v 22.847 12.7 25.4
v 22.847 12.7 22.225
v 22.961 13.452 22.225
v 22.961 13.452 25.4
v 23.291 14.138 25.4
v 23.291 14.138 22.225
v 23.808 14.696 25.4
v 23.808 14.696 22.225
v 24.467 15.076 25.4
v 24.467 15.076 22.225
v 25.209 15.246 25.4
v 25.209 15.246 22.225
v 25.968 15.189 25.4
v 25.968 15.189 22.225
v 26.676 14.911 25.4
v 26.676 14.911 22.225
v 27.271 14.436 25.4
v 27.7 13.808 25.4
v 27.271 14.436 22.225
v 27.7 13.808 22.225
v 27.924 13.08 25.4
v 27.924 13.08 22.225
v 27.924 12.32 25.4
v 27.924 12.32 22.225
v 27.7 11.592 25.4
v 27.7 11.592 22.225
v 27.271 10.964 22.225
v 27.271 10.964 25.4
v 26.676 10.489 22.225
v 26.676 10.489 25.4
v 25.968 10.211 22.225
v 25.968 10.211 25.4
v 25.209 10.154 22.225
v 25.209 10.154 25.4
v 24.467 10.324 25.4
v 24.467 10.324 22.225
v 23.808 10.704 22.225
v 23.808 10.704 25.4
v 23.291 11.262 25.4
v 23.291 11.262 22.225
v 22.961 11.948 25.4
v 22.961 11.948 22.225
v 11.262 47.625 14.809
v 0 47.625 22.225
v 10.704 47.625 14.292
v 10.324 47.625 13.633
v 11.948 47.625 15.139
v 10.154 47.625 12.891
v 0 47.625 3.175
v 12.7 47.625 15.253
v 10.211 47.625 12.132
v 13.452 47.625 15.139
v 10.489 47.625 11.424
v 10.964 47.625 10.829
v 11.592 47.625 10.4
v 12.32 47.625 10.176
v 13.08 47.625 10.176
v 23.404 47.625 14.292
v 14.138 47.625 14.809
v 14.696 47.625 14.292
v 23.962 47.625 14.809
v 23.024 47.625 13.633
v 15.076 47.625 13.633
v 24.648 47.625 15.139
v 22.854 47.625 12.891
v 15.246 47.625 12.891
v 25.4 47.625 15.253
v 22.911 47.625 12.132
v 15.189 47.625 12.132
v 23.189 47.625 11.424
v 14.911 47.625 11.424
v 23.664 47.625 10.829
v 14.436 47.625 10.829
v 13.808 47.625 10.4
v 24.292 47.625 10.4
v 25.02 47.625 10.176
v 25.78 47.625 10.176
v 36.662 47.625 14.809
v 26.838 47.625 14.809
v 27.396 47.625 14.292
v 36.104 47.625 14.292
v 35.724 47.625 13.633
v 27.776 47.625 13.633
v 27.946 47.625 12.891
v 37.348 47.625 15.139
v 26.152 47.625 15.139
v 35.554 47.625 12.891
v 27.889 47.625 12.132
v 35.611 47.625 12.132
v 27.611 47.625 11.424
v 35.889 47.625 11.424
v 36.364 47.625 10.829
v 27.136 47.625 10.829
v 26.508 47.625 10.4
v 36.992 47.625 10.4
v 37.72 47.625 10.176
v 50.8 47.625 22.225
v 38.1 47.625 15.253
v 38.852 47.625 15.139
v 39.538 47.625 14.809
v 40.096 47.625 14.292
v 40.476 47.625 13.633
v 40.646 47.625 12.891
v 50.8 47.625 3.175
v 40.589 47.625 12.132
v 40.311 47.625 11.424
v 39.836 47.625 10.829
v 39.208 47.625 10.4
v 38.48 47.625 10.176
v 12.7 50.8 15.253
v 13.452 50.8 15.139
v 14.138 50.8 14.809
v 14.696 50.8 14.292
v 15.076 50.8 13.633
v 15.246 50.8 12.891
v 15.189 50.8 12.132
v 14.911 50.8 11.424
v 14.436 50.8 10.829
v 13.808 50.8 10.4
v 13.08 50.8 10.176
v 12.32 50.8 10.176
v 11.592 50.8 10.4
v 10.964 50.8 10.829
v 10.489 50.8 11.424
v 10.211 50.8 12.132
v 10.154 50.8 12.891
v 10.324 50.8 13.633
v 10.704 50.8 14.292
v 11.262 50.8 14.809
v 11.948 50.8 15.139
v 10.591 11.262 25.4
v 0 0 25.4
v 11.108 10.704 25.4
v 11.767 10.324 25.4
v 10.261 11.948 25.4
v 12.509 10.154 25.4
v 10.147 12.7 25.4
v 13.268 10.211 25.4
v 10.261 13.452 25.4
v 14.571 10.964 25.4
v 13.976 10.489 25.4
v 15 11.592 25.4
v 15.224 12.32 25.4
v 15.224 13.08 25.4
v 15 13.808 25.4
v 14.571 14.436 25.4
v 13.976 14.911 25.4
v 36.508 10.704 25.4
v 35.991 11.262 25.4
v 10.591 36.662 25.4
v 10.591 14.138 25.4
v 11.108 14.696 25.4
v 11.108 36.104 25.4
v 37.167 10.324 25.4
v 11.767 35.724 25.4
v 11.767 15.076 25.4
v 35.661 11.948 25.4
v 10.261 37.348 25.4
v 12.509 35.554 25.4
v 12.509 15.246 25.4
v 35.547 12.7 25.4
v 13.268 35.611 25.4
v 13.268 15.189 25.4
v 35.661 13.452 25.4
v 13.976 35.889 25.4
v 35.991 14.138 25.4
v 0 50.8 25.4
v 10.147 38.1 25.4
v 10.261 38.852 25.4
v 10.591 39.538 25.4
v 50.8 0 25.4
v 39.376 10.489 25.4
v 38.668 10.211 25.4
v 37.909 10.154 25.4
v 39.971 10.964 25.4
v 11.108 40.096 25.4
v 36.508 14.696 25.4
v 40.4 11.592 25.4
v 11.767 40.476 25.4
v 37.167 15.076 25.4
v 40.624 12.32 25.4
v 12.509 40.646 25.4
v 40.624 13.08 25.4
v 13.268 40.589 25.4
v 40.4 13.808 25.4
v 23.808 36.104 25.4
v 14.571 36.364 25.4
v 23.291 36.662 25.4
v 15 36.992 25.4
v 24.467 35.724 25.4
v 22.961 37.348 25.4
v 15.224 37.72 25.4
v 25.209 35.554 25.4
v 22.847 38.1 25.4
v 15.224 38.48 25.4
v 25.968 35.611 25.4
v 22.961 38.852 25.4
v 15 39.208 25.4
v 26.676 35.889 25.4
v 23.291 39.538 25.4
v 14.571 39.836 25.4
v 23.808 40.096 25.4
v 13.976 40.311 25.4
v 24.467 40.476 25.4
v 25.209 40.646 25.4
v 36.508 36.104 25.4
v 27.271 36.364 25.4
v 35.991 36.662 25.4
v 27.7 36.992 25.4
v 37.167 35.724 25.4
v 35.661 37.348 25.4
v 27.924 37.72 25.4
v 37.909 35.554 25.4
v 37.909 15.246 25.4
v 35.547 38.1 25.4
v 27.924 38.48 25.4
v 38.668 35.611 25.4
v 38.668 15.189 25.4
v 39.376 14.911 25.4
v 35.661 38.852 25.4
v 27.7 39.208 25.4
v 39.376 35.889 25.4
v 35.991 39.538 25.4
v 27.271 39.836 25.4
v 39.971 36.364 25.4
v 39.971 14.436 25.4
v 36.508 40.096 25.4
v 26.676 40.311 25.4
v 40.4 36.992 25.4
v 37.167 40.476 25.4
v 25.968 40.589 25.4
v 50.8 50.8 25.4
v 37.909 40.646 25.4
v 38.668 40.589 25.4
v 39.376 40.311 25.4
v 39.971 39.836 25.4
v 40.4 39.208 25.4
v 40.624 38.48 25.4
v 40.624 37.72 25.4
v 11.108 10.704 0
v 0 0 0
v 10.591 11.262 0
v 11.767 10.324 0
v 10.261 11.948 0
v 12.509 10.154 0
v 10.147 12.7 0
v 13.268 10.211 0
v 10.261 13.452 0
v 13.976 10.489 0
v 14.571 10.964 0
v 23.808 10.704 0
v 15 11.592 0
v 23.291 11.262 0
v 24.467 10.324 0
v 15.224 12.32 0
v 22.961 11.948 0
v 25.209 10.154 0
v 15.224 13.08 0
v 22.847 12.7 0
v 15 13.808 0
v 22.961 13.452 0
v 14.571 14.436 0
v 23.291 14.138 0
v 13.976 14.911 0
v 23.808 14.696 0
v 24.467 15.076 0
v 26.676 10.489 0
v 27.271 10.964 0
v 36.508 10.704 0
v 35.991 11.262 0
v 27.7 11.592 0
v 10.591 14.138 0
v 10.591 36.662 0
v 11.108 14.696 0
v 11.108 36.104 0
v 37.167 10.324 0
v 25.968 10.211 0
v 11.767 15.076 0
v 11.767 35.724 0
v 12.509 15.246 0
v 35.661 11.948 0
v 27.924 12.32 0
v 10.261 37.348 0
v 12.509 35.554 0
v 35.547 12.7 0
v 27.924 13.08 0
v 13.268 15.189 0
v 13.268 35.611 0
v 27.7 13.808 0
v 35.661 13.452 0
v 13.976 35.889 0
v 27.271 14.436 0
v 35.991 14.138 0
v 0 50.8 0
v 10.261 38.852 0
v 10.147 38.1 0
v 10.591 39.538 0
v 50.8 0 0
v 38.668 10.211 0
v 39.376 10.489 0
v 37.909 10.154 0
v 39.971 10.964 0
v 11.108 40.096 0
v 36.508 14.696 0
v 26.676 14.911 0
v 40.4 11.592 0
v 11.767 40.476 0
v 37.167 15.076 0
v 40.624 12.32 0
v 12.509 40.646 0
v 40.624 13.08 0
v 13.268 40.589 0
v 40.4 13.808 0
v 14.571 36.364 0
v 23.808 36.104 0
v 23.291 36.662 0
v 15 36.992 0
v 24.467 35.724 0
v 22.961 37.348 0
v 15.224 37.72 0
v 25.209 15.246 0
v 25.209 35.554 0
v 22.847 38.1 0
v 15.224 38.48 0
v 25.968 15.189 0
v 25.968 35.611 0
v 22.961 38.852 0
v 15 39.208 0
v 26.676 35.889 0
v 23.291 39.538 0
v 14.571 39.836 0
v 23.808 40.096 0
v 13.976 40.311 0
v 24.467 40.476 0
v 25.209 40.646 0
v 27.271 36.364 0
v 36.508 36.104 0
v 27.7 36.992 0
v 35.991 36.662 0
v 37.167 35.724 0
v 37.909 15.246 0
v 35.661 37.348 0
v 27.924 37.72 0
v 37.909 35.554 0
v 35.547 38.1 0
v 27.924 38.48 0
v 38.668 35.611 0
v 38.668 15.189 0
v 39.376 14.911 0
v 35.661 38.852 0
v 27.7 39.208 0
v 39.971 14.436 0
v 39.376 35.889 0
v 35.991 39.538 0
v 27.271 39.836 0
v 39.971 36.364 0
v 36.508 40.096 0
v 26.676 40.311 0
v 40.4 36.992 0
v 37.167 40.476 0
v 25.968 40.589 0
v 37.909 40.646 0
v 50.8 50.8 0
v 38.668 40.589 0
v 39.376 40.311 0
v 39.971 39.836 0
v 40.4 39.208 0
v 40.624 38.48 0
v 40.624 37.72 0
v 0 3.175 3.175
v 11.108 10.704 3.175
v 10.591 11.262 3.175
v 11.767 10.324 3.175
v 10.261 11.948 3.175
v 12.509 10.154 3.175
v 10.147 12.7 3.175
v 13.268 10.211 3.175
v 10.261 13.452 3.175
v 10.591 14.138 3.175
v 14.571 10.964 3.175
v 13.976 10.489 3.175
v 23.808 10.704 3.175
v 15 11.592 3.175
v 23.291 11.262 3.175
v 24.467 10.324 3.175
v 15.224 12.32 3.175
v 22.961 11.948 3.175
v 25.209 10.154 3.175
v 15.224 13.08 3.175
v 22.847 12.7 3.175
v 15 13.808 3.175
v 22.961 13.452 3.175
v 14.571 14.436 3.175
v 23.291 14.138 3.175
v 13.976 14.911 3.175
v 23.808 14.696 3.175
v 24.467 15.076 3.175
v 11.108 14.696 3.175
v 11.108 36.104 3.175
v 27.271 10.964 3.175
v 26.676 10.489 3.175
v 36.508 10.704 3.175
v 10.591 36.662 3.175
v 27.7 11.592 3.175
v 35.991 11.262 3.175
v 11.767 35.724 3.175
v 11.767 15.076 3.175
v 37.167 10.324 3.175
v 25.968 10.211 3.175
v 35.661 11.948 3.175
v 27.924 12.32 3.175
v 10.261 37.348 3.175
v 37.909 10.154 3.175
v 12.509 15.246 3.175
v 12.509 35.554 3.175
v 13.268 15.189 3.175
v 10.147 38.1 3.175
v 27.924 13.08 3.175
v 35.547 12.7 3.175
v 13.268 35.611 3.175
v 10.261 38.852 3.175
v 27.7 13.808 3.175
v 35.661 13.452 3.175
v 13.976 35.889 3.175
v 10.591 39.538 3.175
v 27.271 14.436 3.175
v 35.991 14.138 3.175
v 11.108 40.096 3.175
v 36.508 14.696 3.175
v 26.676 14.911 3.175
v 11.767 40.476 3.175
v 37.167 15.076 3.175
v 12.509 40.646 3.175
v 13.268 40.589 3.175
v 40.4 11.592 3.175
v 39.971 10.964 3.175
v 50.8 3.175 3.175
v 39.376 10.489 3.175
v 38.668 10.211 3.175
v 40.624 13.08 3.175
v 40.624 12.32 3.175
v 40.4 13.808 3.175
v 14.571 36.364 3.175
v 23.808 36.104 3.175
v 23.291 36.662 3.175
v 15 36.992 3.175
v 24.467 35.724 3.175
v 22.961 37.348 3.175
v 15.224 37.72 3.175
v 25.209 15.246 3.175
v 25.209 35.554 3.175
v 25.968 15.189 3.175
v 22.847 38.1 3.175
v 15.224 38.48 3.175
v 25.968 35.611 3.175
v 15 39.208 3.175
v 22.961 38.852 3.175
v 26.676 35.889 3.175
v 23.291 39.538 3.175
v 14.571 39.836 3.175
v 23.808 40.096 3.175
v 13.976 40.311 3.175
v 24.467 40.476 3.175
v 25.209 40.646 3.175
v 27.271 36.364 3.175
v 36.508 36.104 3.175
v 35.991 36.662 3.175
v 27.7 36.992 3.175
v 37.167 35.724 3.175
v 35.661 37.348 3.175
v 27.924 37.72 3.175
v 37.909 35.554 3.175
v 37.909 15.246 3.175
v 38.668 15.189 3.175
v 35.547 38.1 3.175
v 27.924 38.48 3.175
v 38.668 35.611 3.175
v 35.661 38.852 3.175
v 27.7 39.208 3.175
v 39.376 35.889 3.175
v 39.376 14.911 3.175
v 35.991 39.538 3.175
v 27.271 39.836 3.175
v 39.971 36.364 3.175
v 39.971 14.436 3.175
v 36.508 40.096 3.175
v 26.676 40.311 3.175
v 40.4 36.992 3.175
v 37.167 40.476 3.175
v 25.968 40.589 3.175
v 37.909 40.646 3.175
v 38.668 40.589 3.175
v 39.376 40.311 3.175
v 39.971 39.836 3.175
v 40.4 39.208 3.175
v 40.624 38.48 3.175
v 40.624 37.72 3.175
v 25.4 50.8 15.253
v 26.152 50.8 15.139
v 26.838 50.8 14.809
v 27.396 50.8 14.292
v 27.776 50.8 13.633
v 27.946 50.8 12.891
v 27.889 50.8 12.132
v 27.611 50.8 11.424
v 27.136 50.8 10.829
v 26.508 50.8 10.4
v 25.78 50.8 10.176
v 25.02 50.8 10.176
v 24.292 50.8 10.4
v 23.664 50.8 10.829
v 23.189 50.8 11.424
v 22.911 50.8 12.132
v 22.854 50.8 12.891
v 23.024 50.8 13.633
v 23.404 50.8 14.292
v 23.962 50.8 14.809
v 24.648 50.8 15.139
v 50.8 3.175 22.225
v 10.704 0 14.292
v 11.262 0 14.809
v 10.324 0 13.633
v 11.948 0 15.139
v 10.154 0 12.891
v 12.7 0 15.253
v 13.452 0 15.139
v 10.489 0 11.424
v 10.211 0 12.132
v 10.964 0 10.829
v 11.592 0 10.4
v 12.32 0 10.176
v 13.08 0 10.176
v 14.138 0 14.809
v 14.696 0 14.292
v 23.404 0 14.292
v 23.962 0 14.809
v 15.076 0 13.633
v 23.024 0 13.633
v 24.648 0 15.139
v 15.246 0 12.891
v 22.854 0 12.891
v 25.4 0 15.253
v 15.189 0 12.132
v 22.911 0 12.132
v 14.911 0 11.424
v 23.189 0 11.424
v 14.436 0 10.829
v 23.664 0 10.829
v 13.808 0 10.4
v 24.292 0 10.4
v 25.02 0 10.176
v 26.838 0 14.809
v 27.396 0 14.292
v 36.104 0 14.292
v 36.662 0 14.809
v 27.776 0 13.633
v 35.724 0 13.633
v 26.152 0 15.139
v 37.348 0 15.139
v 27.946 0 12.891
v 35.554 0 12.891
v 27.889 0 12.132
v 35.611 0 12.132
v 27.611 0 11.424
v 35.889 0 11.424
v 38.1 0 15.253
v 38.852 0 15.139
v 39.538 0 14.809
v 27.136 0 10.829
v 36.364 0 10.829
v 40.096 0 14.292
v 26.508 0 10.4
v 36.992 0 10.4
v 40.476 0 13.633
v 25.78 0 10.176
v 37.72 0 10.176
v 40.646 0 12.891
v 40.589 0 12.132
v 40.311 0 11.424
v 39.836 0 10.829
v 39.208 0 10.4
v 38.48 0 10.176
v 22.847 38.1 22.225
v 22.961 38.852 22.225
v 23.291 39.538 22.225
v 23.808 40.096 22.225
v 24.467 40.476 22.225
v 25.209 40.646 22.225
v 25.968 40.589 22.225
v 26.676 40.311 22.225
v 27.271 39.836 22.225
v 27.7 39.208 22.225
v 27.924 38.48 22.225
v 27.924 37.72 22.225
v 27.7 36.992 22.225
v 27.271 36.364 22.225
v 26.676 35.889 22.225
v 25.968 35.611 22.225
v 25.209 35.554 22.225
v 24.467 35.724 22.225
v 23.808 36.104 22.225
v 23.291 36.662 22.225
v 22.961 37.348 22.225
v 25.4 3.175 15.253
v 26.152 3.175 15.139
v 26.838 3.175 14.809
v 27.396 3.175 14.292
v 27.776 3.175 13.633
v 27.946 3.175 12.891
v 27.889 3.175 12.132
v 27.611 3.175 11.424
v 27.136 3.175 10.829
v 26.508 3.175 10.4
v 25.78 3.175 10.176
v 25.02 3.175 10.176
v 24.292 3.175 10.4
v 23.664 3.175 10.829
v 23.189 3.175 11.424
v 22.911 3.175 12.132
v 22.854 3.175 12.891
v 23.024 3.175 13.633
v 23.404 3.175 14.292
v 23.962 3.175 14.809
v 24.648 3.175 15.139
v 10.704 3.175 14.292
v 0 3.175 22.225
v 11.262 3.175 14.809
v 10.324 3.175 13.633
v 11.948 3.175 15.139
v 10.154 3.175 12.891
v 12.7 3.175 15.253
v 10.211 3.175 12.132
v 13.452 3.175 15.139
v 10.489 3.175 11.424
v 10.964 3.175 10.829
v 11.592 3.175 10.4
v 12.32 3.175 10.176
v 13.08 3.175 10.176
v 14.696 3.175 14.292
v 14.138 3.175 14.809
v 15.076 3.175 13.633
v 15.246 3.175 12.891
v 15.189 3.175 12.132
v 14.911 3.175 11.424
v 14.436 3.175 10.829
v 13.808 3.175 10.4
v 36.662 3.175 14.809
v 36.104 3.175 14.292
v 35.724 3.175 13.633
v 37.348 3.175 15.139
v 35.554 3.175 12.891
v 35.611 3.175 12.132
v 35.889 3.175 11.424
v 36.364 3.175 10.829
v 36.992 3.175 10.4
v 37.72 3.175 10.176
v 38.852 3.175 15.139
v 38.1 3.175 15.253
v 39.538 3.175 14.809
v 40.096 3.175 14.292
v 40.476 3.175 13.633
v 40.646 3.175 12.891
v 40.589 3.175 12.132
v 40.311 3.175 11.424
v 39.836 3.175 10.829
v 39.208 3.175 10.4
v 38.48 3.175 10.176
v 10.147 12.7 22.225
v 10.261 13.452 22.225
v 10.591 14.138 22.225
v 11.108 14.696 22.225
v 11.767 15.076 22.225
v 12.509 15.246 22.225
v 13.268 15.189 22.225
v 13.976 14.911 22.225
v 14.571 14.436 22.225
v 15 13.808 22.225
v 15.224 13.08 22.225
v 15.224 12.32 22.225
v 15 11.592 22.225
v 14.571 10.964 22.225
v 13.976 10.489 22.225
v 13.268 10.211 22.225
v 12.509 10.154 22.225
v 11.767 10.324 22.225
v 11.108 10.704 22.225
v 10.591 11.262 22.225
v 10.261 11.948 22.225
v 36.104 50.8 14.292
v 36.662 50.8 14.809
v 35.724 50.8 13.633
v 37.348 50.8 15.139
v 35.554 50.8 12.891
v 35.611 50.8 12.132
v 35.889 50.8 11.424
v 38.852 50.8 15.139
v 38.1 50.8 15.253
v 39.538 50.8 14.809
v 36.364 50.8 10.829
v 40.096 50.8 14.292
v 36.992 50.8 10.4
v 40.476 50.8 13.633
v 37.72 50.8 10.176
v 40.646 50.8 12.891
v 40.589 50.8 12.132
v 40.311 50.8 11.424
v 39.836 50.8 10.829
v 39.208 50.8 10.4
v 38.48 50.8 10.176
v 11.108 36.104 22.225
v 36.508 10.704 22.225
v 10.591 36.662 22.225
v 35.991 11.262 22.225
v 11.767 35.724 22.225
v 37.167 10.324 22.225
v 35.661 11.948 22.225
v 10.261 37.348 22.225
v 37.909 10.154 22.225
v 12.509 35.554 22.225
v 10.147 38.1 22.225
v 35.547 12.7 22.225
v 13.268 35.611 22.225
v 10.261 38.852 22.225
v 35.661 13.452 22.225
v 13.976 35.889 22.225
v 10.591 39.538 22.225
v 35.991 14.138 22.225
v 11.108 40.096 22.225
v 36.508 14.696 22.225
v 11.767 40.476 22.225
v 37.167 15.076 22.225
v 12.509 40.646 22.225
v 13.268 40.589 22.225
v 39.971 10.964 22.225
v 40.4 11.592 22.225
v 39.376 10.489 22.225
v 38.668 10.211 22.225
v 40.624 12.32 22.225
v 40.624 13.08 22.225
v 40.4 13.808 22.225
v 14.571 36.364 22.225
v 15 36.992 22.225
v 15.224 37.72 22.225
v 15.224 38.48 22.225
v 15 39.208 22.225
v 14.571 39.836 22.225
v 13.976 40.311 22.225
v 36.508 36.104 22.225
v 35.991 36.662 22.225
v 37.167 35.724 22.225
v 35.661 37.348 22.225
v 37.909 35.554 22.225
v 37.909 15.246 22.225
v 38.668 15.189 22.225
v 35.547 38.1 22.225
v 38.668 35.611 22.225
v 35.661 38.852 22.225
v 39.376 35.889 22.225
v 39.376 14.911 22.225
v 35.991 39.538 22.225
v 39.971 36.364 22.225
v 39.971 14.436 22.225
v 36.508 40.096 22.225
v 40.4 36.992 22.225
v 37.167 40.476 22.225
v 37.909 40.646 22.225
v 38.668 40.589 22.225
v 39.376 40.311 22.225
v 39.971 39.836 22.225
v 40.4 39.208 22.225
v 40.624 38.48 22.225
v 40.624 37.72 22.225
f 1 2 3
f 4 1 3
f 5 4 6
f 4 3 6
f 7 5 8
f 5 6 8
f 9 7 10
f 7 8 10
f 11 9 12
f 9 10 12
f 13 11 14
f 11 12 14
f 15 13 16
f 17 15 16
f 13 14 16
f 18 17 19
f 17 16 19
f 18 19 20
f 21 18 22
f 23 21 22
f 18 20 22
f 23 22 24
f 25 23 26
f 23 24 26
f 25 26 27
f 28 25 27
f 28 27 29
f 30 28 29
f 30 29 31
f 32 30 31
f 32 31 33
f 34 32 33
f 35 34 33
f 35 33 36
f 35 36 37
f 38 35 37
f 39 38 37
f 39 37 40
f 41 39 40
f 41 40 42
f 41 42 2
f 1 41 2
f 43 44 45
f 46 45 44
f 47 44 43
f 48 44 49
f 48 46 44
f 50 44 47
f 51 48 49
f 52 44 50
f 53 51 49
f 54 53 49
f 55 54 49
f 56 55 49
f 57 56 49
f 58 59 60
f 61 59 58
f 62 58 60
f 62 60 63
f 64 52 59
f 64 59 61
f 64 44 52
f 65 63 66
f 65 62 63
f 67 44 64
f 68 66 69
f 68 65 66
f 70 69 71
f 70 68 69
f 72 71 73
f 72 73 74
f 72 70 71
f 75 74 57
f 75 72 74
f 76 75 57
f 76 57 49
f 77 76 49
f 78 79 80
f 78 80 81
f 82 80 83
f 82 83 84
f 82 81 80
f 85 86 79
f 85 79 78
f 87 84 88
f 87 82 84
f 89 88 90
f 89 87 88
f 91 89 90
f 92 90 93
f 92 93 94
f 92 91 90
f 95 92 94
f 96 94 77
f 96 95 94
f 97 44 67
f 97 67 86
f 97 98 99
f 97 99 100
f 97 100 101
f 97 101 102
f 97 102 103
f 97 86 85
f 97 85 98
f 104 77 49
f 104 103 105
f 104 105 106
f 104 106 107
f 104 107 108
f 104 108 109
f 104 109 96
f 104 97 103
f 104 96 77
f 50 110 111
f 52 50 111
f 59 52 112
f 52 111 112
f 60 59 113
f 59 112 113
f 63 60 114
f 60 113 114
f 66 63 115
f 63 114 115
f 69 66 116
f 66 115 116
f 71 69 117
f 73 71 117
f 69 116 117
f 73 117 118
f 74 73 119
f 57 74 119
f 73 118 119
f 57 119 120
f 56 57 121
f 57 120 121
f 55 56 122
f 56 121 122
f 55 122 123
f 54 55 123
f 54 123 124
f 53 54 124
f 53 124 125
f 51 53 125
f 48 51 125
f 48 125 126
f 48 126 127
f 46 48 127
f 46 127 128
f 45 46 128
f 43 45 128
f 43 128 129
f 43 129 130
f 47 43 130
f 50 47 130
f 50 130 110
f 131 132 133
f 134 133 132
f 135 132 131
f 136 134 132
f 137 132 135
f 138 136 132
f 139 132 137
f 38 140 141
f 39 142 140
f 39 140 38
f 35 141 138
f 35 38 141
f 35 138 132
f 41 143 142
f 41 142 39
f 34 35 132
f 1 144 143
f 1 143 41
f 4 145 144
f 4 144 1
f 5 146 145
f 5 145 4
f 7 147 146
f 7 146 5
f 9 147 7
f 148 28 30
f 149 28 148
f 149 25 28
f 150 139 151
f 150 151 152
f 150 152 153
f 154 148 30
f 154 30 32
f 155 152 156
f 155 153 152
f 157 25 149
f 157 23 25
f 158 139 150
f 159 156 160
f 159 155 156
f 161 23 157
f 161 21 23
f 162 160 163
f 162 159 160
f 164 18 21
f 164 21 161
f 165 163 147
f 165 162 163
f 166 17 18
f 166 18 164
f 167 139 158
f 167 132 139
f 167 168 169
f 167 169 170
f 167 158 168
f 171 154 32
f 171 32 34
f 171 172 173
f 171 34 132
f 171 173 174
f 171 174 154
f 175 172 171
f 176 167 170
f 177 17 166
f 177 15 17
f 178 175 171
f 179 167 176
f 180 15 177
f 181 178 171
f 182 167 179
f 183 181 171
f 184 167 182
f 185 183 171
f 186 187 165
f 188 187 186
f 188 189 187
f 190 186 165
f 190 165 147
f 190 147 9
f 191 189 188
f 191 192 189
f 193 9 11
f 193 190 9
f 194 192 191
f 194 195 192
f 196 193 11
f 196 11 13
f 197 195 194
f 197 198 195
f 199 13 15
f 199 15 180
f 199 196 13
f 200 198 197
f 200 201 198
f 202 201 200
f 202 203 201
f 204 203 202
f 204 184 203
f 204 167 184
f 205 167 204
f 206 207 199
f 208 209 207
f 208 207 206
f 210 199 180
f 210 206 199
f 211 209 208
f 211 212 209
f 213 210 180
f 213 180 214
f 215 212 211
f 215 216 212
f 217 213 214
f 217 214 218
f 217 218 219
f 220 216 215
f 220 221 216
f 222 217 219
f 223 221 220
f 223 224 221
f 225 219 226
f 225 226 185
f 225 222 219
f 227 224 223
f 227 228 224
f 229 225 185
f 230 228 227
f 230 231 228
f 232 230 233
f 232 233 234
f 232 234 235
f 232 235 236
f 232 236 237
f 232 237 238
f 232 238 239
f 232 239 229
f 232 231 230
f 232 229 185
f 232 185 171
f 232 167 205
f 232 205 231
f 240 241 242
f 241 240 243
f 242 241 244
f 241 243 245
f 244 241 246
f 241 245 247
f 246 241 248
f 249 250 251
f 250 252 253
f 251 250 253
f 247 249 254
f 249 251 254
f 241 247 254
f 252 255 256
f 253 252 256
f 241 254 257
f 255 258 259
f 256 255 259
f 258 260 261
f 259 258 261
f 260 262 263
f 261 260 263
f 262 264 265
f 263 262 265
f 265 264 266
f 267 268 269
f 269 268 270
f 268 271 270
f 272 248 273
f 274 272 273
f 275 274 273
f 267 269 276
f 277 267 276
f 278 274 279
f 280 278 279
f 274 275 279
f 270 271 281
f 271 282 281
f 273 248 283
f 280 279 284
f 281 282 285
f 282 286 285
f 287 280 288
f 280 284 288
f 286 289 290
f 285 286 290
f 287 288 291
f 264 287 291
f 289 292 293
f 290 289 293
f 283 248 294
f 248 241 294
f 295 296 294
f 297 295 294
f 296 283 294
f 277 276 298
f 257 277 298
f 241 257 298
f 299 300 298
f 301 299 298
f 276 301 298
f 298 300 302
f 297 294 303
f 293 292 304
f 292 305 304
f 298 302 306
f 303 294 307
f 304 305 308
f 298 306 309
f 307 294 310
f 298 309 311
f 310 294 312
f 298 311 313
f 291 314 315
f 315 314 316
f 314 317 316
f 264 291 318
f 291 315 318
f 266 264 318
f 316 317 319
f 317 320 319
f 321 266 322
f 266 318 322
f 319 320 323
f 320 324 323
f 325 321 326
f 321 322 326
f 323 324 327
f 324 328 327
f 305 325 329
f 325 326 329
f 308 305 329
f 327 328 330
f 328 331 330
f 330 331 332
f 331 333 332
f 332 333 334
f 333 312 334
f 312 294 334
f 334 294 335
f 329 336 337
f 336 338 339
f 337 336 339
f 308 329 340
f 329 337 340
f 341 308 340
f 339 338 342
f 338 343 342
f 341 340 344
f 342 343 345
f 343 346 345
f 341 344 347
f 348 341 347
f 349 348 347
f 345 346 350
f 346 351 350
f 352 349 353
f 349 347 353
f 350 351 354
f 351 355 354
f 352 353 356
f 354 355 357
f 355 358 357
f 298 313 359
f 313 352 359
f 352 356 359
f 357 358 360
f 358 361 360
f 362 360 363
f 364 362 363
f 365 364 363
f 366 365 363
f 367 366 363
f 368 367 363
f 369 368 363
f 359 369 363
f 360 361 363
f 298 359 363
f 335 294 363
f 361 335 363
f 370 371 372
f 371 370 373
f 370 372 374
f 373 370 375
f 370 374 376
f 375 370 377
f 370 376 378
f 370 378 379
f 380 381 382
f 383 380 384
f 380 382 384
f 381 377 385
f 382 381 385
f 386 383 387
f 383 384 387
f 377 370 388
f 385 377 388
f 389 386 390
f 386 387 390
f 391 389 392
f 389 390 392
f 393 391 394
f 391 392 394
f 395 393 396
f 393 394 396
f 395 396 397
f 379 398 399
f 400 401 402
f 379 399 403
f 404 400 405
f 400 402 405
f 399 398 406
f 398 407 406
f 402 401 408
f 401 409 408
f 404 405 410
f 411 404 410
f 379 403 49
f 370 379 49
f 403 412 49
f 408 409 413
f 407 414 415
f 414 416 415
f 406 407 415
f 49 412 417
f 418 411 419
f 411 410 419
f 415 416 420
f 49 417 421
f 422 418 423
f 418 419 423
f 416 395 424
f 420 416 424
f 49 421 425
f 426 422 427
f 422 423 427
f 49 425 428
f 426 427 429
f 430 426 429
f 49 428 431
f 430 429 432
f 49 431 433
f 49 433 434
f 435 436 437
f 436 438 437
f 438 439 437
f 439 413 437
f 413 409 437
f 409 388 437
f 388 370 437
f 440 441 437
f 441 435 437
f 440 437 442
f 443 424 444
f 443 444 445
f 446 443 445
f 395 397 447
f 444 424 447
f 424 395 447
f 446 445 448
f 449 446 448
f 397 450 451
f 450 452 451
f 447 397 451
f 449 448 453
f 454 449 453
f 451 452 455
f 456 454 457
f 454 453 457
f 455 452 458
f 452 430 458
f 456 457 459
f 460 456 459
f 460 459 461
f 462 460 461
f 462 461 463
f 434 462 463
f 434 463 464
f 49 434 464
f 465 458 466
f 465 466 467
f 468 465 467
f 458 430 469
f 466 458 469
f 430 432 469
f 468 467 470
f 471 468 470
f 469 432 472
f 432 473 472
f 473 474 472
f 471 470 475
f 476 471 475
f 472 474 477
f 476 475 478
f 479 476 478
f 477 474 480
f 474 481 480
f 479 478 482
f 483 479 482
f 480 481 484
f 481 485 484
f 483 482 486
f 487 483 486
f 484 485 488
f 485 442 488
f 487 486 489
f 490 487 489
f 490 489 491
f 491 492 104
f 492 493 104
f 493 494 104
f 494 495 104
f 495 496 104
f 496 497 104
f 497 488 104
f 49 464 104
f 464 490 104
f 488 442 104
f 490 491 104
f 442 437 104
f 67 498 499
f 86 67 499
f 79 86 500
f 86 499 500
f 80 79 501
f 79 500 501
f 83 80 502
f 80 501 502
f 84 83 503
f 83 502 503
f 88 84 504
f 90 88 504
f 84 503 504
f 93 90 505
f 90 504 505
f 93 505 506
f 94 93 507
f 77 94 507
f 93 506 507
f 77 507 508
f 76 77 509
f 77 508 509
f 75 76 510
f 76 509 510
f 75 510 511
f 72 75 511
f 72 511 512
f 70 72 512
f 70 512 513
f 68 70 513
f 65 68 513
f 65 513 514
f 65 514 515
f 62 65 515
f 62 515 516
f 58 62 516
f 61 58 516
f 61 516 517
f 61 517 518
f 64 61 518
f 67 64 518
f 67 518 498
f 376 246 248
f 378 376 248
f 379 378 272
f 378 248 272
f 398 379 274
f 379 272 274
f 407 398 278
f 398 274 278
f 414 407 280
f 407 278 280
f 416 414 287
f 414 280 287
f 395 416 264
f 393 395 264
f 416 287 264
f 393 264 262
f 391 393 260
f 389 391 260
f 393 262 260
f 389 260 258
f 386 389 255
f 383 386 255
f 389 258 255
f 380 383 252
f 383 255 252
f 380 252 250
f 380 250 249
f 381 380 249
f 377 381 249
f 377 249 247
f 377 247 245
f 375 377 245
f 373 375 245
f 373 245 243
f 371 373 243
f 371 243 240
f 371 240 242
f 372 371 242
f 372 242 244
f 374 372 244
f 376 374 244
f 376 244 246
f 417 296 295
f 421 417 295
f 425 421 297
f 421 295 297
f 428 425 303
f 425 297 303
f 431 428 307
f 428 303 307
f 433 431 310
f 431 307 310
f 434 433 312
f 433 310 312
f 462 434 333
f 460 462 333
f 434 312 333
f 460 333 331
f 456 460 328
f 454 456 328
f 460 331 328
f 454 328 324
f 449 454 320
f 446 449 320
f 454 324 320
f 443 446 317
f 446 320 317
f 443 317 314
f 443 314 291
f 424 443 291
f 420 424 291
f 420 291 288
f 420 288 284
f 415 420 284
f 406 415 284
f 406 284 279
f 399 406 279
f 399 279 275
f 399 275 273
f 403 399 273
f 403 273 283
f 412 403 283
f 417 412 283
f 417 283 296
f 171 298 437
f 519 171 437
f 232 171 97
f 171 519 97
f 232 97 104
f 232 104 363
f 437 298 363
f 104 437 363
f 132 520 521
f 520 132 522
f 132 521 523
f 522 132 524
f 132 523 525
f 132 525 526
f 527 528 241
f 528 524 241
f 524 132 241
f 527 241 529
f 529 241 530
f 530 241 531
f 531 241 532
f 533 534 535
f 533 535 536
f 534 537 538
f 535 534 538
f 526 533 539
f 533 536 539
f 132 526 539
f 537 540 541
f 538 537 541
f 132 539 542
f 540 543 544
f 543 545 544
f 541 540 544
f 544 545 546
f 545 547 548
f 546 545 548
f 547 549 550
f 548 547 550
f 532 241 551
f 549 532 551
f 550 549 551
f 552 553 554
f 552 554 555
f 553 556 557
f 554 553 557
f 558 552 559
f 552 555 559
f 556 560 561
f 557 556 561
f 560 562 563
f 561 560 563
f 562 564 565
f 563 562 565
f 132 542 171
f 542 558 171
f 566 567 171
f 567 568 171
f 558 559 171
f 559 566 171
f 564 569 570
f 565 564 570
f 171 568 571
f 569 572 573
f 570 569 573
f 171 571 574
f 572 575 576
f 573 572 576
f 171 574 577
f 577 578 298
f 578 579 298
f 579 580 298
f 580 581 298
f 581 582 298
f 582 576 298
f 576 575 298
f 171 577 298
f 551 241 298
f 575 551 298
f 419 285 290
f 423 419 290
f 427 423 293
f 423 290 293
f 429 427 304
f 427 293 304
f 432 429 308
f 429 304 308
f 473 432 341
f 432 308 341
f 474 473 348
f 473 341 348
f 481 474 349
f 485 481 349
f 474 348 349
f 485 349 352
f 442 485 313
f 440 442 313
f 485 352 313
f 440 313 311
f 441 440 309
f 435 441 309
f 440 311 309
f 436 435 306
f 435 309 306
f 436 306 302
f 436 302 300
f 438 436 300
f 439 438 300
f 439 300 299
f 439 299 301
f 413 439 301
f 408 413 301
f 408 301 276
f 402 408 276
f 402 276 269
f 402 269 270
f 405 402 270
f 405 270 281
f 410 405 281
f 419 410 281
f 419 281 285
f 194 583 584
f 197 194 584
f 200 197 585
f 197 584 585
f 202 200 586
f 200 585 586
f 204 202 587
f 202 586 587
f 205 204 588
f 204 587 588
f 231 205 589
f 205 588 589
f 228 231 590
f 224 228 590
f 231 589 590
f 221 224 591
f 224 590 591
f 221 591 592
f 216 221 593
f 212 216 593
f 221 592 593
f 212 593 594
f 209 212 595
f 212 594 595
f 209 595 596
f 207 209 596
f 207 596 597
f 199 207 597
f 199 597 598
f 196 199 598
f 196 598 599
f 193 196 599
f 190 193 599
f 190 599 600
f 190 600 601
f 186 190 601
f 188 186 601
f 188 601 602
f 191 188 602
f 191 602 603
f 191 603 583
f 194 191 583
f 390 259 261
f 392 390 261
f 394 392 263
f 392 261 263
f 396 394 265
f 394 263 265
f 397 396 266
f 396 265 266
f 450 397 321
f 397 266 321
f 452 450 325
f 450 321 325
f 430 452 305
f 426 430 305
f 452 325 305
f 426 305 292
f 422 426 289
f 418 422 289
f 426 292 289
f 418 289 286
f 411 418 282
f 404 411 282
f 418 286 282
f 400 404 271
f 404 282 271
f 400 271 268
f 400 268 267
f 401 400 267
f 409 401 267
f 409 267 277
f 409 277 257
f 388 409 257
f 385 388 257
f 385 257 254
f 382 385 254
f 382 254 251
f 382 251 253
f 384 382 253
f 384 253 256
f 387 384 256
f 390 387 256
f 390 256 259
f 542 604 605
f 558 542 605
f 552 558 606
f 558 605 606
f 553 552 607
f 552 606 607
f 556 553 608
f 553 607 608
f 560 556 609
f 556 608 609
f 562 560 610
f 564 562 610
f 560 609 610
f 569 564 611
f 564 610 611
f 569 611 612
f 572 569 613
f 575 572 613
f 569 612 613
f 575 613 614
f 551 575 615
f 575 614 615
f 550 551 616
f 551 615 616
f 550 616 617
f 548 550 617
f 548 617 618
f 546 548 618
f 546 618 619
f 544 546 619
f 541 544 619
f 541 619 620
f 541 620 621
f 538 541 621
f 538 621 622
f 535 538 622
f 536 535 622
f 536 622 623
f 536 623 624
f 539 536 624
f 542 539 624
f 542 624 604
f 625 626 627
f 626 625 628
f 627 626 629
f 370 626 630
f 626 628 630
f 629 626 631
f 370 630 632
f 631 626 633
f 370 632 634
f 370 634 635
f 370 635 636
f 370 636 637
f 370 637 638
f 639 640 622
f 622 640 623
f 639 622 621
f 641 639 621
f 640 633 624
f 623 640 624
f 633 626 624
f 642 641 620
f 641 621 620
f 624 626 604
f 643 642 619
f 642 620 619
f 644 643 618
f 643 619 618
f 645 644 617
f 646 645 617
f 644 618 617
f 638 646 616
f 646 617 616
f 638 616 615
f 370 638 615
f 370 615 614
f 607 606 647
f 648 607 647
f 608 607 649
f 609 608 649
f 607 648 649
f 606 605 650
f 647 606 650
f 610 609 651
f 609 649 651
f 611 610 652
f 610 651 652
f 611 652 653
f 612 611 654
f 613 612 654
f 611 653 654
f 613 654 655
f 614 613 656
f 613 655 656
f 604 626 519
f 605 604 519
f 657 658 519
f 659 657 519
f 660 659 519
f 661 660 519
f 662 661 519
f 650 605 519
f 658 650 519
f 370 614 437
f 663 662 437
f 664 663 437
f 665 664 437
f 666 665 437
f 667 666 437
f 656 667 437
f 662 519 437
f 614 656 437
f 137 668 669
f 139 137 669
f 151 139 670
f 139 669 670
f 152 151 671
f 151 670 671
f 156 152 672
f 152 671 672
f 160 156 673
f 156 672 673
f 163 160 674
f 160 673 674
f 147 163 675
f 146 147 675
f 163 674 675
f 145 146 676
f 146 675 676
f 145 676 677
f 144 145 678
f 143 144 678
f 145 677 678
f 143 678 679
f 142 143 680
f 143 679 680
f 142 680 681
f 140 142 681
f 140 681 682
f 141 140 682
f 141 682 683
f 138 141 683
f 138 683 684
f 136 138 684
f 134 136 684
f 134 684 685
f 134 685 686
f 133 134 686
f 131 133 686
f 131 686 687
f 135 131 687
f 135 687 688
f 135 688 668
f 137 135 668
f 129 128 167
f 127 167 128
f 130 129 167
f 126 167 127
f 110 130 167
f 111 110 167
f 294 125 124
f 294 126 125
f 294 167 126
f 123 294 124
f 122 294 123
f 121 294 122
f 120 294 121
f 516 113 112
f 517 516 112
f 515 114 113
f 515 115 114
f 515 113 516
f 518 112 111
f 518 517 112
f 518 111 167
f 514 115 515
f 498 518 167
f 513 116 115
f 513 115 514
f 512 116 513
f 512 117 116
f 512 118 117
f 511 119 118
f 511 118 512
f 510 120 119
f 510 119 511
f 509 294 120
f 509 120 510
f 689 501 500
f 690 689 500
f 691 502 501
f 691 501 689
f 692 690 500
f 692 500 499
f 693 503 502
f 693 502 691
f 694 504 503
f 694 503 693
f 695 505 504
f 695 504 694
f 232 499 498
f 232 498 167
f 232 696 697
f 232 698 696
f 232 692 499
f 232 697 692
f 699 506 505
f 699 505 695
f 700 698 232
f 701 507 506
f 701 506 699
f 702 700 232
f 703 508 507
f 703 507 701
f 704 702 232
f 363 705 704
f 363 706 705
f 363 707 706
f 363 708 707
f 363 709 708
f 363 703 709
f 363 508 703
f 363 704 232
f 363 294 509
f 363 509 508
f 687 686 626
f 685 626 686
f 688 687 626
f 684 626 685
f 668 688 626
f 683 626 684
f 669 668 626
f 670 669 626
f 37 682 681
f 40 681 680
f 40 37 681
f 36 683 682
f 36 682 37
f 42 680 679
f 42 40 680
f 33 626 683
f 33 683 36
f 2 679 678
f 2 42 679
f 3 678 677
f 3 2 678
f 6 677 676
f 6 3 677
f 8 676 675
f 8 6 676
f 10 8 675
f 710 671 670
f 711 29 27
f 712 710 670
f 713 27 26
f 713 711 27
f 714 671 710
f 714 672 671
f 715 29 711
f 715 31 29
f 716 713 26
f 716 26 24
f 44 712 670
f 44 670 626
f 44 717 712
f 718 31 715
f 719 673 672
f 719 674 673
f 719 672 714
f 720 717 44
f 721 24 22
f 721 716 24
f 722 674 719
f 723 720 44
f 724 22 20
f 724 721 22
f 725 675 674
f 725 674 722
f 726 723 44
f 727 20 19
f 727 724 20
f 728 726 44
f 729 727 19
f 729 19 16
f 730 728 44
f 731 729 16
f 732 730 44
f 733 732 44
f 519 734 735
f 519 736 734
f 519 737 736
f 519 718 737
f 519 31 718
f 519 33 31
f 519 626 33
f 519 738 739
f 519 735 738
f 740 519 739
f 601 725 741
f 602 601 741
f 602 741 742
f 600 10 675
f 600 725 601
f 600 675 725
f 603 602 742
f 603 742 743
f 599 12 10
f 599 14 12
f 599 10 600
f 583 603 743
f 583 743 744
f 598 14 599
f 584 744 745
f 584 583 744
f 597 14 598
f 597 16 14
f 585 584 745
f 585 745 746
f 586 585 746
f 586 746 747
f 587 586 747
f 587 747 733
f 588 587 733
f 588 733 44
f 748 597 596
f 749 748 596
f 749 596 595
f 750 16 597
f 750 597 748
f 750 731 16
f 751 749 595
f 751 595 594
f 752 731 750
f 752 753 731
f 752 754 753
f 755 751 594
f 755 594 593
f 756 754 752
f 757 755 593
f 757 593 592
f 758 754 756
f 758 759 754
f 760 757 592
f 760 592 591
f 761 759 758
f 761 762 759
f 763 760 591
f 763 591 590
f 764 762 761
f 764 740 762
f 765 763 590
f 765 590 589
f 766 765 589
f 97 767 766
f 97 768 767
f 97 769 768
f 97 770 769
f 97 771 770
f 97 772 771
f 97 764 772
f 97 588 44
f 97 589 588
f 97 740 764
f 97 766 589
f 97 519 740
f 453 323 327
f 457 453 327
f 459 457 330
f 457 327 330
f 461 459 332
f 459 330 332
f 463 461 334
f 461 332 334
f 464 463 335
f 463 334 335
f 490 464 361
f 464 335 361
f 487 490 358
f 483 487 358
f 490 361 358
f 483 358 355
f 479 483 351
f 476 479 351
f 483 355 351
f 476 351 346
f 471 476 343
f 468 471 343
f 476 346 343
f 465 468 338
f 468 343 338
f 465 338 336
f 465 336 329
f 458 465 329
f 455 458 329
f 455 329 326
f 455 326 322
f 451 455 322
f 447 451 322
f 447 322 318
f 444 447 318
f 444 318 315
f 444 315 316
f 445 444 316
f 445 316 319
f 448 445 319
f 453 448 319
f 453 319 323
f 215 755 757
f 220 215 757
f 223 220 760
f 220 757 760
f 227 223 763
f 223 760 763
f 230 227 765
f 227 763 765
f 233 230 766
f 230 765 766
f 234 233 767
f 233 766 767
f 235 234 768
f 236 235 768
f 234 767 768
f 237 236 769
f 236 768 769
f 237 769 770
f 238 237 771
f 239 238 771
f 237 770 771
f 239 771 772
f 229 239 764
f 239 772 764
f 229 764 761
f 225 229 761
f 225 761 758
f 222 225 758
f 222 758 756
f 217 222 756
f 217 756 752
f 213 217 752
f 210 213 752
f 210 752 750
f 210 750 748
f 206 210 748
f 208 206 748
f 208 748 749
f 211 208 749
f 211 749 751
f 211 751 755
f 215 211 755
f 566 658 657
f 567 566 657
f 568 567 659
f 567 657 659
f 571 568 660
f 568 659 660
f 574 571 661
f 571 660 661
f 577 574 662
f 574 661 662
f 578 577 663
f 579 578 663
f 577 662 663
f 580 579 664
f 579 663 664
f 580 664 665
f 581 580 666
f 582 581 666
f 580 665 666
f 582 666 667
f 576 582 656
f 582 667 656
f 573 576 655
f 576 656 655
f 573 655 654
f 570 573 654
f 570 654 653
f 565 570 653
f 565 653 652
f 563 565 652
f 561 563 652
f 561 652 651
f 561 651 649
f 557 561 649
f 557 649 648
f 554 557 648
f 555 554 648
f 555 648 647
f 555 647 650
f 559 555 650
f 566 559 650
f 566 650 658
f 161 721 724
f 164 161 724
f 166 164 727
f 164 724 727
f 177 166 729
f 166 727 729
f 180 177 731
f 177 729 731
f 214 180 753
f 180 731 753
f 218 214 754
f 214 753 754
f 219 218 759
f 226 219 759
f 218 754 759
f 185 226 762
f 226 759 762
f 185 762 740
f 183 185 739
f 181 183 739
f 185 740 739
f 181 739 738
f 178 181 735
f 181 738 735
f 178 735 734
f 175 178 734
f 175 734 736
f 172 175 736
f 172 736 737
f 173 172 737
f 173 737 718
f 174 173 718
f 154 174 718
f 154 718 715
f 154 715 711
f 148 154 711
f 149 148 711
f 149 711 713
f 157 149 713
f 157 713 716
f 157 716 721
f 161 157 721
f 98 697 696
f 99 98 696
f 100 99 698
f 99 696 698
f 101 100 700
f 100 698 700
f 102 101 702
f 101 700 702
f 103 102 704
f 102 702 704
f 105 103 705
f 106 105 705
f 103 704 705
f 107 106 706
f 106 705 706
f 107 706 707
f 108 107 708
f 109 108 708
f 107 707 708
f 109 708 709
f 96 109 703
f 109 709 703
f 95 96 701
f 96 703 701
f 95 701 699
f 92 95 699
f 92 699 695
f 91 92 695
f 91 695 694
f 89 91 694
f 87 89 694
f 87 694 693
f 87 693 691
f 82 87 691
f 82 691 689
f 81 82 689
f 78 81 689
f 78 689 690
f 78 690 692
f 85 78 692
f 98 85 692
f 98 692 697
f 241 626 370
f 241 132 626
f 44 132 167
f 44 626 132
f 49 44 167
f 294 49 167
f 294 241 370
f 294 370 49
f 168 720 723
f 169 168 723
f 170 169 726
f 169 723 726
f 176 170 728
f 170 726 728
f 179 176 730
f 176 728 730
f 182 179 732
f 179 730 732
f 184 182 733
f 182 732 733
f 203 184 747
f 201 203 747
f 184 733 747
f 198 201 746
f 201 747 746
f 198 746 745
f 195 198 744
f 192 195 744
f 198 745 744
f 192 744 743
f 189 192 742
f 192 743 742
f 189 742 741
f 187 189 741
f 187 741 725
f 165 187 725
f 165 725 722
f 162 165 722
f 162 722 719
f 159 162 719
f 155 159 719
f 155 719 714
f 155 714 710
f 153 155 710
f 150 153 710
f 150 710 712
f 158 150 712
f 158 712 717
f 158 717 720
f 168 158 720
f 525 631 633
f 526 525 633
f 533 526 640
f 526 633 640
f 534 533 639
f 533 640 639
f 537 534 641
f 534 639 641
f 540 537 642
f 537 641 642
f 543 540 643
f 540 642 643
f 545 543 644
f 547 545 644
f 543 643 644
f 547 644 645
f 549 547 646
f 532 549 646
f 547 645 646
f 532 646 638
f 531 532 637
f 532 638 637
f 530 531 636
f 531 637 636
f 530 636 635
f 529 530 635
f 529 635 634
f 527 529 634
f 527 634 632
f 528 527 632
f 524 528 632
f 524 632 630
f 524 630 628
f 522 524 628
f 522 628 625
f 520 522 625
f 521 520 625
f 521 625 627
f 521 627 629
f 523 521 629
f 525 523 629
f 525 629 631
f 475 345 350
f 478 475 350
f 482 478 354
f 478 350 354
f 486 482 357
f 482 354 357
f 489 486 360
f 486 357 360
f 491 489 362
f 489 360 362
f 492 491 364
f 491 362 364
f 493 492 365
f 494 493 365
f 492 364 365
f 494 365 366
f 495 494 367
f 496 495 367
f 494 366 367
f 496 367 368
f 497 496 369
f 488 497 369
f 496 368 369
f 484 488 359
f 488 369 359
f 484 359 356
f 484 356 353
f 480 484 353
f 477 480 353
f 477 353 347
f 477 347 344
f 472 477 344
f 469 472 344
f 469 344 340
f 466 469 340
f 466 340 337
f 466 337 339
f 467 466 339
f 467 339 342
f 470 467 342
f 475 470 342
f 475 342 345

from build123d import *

# Parameters (mm, degrees)
SKETCH1_W           = 50.8
SKETCH1_H           = 50.8
BOSS_EXTRUDE1_DEPTH = 25.4
SKETCH2_W           = 19.05
SKETCH2_H           = 44.45
CUT_EXTRUDE1_DEPTH  = 77.2
SKETCH3_R           = 2.5527
CUT_EXTRUDE2_DEPTH  = 77.2
SKETCH4_R           = 2.5527
CUT_EXTRUDE3_DEPTH  = 77.2


with BuildPart() as part:
    # Sketch1 → Boss-Extrude1 (new body)
    with BuildSketch(Plane.XY):
        with Locations((25.4, 25.4)):
            Rectangle(SKETCH1_W, SKETCH1_H)
    extrude(amount=BOSS_EXTRUDE1_DEPTH)

    # Sketch2 → Cut-Extrude1 (cut, through all)
    with BuildSketch(Plane(origin=(50.8, 0, 0), x_dir=(0, 0, -1), z_dir=(1, 0, 0))):
        with Locations((-12.7, 25.4)):
            Rectangle(SKETCH2_W, SKETCH2_H)
    extrude(amount=-CUT_EXTRUDE1_DEPTH, mode=Mode.SUBTRACT)

    # Sketch3 → Cut-Extrude2 (cut, through all)
    with BuildSketch(Plane(origin=(0, 50.8, 0), x_dir=(1, 0, 0), z_dir=(0, 1, 0))):
        with Locations(Location((12.7, -12.7, 0), (0, 0, 270))):
            Circle(SKETCH3_R)
        with Locations(Location((25.4, -12.7, 0), (0, 0, 270))):
            Circle(SKETCH3_R)
        with Locations(Location((38.1, -12.7, 0), (0, 0, 270))):
            Circle(SKETCH3_R)
    extrude(amount=-CUT_EXTRUDE2_DEPTH, mode=Mode.SUBTRACT)

    # Sketch4 → Cut-Extrude3 (cut, through all)
    with BuildSketch(Plane(origin=(0, 0, 0), x_dir=(-1, 0, 0), z_dir=(0, 0, -1))):
        with Locations((-38.1, 38.1)):
            Circle(SKETCH4_R)
        with Locations((-25.4, 38.1)):
            Circle(SKETCH4_R)
        with Locations((-12.7, 38.1)):
            Circle(SKETCH4_R)
        with Locations((-38.1, 12.7)):
            Circle(SKETCH4_R)
        with Locations((-25.4, 12.7)):
            Circle(SKETCH4_R)
        with Locations((-12.7, 12.7)):
            Circle(SKETCH4_R)
    extrude(amount=-CUT_EXTRUDE3_DEPTH, mode=Mode.SUBTRACT)


solid = part.part
